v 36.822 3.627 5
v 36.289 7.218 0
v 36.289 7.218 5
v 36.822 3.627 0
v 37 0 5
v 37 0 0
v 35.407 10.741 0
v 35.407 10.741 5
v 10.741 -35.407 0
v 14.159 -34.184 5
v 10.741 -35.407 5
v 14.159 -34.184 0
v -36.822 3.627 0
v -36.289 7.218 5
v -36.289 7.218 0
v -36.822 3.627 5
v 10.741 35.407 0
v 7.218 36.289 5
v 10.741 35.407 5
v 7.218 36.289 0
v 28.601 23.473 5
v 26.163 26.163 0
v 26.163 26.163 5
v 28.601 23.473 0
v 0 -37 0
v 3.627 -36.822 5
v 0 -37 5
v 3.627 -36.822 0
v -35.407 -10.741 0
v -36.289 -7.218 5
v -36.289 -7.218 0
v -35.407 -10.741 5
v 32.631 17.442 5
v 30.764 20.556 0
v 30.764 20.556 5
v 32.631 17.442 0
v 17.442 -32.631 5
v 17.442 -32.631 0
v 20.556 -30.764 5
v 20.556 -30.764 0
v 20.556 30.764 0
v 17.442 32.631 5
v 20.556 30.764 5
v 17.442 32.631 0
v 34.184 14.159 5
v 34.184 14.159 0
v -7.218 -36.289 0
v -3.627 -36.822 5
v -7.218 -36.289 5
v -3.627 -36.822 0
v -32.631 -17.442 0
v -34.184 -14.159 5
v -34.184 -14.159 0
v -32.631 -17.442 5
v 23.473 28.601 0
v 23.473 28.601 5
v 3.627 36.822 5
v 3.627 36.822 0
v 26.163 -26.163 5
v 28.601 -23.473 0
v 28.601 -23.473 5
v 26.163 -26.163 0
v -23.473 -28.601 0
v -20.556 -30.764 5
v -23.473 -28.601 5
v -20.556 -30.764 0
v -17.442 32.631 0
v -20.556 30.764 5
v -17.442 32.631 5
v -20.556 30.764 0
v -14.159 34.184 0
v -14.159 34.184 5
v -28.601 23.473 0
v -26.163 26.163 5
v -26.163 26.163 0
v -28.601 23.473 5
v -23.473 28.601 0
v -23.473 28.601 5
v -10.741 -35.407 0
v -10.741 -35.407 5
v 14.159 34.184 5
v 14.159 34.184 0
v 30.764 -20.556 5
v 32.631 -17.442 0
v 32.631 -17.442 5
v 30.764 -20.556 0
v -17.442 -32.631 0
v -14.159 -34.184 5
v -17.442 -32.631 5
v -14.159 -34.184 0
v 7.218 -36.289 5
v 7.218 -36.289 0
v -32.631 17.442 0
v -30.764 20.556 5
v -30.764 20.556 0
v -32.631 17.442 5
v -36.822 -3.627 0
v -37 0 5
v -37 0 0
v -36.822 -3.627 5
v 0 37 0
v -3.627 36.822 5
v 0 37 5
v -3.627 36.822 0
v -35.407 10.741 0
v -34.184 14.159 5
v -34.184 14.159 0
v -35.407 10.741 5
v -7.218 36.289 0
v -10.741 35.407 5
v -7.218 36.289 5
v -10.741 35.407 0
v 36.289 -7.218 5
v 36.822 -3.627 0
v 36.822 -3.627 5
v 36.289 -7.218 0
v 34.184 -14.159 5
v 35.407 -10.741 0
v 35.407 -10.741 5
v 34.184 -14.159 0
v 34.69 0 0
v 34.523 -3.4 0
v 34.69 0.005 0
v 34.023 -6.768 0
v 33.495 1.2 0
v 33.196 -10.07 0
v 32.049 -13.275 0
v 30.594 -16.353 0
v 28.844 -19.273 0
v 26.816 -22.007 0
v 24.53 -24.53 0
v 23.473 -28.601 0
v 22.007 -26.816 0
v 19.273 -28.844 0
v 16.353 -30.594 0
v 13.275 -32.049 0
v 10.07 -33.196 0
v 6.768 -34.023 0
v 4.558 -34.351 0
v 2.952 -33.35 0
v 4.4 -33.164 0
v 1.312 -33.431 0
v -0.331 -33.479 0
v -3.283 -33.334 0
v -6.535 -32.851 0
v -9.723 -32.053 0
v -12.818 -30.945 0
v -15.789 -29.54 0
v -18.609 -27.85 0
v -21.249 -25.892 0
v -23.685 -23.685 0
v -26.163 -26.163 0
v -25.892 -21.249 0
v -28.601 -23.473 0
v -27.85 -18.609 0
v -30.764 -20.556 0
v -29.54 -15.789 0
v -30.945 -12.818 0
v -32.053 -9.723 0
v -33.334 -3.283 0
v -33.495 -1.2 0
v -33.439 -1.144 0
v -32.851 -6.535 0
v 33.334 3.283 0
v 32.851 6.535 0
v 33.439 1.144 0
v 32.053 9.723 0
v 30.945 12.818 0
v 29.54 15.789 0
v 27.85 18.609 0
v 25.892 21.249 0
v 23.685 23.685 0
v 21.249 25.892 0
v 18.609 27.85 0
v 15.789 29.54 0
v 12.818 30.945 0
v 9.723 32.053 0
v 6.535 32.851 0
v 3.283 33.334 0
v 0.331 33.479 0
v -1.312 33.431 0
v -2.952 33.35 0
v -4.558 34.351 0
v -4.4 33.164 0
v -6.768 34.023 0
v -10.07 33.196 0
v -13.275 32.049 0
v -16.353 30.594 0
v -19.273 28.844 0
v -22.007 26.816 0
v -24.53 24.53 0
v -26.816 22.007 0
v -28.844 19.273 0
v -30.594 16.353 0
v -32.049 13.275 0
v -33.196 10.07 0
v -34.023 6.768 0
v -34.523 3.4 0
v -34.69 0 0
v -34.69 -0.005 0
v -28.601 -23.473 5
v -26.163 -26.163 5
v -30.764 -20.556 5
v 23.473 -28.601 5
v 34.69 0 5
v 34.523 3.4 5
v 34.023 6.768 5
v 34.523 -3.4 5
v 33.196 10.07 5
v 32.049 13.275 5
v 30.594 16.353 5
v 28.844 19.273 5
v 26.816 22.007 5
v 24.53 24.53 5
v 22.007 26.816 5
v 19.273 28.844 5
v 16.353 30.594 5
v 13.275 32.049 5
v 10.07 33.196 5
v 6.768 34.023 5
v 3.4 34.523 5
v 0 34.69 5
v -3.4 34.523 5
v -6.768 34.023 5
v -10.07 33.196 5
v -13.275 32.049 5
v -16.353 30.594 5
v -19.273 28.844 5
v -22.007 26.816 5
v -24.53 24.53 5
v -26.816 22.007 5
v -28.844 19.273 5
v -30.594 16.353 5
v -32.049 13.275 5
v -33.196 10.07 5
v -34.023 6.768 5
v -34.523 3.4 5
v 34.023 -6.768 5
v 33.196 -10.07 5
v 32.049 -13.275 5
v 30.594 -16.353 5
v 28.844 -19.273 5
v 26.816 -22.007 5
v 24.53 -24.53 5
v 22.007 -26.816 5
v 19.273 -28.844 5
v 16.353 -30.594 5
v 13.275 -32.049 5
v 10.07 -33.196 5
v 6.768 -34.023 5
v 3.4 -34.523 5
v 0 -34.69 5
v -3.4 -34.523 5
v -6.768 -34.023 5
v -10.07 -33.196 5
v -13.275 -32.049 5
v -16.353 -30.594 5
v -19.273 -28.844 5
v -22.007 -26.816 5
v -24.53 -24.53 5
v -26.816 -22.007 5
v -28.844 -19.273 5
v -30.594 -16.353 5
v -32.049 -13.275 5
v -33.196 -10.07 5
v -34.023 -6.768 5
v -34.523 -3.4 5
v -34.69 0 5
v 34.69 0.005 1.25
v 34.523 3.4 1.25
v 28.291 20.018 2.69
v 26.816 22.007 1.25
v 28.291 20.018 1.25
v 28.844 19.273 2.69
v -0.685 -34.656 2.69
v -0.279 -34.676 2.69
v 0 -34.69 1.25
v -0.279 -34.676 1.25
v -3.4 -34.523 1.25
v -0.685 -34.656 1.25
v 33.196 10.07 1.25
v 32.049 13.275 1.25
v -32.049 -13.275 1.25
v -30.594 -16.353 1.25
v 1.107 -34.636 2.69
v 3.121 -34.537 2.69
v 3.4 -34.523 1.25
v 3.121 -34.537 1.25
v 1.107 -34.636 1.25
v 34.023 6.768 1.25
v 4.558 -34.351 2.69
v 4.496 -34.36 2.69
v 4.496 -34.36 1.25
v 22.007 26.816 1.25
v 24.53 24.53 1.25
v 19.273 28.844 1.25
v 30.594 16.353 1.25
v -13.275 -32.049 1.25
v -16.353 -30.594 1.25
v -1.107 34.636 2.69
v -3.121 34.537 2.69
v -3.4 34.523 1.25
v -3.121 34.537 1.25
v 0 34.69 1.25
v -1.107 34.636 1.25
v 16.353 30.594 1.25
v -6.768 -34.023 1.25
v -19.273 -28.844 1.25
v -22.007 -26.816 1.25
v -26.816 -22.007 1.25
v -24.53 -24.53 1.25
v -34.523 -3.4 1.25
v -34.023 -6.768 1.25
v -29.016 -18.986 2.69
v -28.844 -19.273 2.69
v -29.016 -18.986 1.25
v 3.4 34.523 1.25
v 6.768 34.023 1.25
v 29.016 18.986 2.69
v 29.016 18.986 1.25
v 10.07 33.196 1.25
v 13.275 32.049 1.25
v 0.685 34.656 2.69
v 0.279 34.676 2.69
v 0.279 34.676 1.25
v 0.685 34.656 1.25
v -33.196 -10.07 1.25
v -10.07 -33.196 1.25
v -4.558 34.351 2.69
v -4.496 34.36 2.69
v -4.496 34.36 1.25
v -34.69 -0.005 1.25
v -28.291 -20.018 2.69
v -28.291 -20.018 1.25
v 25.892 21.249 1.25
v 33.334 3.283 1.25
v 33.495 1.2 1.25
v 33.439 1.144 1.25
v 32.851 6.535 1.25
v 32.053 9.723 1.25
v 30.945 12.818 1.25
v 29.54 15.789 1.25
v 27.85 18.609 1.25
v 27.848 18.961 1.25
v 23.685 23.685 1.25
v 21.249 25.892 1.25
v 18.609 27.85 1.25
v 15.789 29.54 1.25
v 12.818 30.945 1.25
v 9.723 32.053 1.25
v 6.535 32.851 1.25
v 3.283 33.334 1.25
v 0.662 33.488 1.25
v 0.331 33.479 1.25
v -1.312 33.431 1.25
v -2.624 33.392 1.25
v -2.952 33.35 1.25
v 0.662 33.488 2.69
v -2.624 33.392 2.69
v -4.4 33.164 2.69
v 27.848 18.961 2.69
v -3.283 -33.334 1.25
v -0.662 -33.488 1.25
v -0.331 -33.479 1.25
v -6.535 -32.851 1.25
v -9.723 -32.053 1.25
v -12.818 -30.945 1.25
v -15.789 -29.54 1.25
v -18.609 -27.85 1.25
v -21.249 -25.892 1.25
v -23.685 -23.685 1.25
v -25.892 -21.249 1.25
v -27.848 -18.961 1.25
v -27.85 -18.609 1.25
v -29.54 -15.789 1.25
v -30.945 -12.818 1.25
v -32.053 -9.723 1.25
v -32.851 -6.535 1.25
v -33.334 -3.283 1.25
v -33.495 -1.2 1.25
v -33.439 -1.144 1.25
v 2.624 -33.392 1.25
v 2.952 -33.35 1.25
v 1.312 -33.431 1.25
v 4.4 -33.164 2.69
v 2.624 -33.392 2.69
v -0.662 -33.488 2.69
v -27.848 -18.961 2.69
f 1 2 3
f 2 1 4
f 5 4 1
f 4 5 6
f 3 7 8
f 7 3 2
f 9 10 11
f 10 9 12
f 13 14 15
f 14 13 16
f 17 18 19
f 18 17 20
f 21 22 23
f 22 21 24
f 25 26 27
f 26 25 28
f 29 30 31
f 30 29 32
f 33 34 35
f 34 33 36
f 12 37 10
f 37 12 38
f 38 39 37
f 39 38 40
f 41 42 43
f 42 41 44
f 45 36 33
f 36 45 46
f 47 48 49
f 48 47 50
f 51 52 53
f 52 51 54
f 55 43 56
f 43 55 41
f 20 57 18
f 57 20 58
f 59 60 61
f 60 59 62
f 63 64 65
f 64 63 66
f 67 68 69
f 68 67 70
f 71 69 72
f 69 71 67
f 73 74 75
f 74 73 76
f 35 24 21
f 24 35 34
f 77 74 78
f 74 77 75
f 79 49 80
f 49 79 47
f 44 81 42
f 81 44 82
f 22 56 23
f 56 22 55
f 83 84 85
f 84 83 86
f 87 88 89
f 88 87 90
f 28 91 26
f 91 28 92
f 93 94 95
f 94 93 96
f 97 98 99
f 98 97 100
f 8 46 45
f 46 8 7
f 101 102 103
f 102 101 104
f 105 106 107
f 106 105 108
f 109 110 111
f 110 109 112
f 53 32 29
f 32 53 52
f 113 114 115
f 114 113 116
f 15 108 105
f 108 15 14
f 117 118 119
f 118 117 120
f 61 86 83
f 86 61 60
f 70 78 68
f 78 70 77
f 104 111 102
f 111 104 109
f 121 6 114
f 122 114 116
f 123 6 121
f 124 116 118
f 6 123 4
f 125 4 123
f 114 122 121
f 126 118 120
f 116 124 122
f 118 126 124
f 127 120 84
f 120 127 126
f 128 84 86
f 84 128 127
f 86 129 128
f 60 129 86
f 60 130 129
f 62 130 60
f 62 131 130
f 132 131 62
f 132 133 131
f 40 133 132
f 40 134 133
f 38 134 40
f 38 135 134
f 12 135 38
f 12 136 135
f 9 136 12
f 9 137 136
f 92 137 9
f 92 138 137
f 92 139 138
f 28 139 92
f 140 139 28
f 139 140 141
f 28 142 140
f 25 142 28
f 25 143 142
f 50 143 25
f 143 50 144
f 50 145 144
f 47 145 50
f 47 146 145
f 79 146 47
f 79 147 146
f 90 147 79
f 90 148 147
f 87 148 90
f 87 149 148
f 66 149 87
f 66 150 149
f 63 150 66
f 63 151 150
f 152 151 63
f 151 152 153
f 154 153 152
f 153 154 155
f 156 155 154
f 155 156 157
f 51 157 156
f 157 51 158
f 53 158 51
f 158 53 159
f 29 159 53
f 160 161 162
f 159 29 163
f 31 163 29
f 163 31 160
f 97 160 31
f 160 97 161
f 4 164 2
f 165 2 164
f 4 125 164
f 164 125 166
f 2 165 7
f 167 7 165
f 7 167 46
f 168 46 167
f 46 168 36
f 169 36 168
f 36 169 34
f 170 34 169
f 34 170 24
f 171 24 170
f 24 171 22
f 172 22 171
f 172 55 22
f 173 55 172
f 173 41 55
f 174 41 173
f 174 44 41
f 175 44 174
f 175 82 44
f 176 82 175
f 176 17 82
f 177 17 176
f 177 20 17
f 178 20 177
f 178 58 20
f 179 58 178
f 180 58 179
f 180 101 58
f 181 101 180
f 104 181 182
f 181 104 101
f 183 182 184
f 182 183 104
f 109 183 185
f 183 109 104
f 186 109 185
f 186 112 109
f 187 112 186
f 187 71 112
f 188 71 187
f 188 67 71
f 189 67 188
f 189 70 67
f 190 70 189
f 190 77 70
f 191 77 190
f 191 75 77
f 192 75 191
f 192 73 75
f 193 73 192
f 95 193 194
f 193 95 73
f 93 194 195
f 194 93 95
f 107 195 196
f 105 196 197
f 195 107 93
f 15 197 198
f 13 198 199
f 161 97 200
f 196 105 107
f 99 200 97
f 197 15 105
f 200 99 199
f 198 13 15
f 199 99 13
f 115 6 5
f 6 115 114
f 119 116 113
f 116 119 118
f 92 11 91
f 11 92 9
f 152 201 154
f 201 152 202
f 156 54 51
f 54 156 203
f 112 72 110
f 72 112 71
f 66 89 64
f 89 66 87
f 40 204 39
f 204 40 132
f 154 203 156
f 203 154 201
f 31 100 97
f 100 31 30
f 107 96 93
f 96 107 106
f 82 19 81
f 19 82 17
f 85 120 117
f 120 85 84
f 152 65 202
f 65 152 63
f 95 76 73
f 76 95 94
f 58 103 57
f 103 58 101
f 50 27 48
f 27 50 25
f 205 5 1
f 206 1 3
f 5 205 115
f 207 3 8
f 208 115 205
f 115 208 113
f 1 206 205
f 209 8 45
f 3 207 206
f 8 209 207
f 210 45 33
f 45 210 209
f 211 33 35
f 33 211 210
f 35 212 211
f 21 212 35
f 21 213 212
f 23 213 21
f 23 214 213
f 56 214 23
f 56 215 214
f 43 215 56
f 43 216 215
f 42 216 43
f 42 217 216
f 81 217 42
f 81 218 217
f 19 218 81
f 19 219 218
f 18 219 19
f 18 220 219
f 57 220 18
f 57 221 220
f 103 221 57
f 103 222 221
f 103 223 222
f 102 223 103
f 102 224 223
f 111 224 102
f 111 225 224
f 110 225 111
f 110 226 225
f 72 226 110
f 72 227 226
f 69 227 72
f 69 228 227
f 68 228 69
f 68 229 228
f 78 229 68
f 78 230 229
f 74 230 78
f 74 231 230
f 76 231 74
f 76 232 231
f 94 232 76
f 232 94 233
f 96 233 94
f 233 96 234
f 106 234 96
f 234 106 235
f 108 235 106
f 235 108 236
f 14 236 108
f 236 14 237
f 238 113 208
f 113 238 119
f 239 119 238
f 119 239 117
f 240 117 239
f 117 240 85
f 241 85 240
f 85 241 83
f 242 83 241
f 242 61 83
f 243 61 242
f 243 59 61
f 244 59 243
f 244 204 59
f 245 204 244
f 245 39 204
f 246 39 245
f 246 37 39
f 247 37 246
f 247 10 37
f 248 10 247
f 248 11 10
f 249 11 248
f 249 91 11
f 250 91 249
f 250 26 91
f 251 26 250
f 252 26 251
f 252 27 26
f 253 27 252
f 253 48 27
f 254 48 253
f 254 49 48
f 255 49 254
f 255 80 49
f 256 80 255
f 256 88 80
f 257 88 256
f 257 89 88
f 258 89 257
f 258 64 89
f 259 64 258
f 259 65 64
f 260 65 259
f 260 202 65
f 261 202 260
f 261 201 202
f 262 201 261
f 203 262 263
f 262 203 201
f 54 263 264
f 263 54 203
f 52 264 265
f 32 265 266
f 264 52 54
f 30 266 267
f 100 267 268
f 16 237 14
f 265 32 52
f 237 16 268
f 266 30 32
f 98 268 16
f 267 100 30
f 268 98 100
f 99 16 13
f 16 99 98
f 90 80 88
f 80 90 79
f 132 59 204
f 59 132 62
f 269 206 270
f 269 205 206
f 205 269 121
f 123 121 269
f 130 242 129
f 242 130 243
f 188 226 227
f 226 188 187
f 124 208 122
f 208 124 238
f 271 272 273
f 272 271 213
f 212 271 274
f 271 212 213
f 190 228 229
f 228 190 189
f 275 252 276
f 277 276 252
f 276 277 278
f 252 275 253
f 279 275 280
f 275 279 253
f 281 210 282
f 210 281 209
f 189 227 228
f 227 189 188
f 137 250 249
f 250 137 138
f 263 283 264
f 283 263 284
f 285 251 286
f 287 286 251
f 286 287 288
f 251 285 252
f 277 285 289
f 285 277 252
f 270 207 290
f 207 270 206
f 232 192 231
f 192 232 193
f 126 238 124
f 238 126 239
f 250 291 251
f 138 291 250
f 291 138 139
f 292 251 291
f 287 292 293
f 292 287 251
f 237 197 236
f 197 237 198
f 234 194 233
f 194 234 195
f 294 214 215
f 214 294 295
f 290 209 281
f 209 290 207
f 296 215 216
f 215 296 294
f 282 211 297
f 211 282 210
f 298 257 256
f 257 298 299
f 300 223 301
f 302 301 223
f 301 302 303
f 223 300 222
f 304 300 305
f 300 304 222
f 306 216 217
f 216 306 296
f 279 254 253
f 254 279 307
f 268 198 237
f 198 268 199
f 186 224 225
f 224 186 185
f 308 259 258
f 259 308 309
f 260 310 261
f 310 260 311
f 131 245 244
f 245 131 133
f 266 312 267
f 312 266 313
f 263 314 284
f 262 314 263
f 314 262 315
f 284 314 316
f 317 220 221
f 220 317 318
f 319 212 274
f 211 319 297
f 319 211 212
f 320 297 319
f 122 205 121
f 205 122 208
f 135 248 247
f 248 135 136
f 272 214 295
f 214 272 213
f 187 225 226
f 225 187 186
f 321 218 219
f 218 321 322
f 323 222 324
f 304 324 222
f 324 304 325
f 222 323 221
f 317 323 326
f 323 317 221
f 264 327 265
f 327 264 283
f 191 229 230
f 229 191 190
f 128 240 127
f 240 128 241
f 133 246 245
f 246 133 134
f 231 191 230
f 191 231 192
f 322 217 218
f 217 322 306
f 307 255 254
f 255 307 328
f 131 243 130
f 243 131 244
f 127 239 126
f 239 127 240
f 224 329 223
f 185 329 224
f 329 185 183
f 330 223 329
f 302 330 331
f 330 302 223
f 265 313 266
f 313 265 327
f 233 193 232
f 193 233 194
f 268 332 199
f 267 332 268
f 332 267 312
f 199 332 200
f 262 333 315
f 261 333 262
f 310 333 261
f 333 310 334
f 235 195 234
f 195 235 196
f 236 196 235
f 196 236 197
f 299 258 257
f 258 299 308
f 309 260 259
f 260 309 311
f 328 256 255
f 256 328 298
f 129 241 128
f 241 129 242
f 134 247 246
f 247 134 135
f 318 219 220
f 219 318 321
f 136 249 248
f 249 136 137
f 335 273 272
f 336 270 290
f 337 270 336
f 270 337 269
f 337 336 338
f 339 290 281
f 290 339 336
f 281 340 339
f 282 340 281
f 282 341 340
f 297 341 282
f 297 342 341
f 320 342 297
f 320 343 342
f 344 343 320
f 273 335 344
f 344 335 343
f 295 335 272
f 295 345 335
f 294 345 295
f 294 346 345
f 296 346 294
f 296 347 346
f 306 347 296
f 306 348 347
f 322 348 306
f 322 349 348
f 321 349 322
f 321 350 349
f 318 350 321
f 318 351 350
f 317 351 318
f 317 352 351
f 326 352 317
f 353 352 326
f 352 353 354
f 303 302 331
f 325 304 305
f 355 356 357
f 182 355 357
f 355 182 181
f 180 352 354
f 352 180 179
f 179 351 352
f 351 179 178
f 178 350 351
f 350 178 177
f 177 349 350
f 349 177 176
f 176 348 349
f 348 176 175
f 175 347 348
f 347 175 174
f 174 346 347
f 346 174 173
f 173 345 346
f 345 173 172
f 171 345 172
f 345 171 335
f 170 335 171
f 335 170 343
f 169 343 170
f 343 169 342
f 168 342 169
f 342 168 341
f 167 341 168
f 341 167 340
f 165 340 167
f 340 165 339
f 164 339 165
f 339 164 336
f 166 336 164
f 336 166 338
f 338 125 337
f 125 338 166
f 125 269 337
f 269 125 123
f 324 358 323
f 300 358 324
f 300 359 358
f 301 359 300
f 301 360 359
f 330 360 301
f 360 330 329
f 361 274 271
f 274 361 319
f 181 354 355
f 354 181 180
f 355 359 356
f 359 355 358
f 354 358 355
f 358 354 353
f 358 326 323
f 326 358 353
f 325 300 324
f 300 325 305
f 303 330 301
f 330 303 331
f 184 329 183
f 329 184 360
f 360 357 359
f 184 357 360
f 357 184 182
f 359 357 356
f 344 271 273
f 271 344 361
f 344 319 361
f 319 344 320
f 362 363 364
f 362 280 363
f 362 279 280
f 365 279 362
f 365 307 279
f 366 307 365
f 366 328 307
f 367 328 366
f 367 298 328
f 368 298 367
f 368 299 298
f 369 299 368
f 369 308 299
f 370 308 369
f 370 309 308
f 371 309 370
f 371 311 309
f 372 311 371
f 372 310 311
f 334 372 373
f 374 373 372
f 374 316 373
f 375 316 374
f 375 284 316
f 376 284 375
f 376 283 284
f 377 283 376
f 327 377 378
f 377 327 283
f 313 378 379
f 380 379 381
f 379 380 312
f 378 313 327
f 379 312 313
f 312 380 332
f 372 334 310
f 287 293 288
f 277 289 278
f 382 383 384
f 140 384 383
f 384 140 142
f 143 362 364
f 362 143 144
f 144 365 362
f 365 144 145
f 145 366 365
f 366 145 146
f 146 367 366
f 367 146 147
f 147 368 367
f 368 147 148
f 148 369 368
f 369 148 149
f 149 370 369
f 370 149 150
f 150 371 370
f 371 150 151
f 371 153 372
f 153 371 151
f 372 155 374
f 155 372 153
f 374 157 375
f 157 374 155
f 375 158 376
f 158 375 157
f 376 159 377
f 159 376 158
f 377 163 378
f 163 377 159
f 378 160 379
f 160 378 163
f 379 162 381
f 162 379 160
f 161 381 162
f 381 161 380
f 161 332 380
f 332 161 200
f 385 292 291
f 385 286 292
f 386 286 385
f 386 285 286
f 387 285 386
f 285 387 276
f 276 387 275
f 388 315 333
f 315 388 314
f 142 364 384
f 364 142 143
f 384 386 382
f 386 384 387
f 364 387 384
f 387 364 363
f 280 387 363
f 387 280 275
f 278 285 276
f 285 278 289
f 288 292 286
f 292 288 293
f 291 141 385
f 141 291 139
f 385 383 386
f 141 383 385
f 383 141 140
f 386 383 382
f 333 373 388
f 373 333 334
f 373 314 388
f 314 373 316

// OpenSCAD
lensBaseDiameter = 66;
lensThreadLinearLength = 36.64;
lensThreadLinearLengthToDetent = 30.28;
lensThreadHeight = 1.19;
lensThreadWidth = 1.5;
lensSpaceBelowThread = 1.5;
detentWidth = 1.3;
detentDepth = 1;
endStopLinearLength = 5;
angularTolerance = 15;

outerDiameter = 74;
height = 5;

zTolerance = 0.25;
xyTolerance = 0.5;

function linearToAngular(l,r=lensBaseDiameter/2) = 
    2*asin(l/(2*r));
    
nudge = 0.01;

module hollowCylinder(d1=10,d2=20,h=10) {
    render(convexity=2) 
    difference() {
        cylinder(d=d2,h=h);
        translate([0,0,-nudge]) cylinder(d=d1,h=h+2*nudge);
    }
}
    
module arc(angle=180,d=undef,r=10,width=1,outward=true,center=true,chamferLowerEnd=false) {
    r0 = d==undef ? r : d/2;
    r1 = outward ? r0 : r0-width;
    r2 = outward ? r0+width : r0;
    adjR2 = 4*r2;
    angle0 = center ? -angle/2 : 0;
    render(convexity=2)
    difference() {
        intersection() {
            difference() {
                circle(r=r2);
                circle(r=r1);
            }
            if (angle<360)
               polygon(concat([[0,0]], adjR2*[for(i=[0:3]) [cos(angle*i/3+angle0),sin(angle*i/3+angle0)]]));
        }
        if(chamferLowerEnd) {
            rotate(angle0) translate([r1,0]) circle(r=width,$fn=4);
        }
    }
}

module base() {
    d1 = lensBaseDiameter+2*lensThreadHeight+2*xyTolerance;
    arcAngle = 180-linearToAngular(lensThreadLinearLength)-angularTolerance;
    endStopAngle = linearToAngular(endStopLinearLength);

    module detent() {
        polygon([[d1/2-detentDepth,0],[d1/2,-detentWidth/2],[d1/2,detentWidth/2]]);
    }

    hollowCylinder(d2=outerDiameter,d1=d1, h=height);
    
    for (rot=[0:180:180]) rotate([0,0,rot]) {
        linear_extrude(height=lensSpaceBelowThread-zTolerance) {
            {
                arc(angle=arcAngle,d=d1+nudge,width=nudge+lensThreadHeight, center=false,outward=false,chamferLowerEnd=true);
            }
        }
        linear_extrude(height=lensSpaceBelowThread+lensThreadHeight) {
            rotate(arcAngle-endStopAngle)
            arc(angle=endStopAngle,d=d1+nudge,width=nudge+lensThreadHeight, center=false, outward=false);
            rotate(arcAngle-endStopAngle-linearToAngular(lensThreadLinearLengthToDetent)) detent();            
        }
    }
}

$fn = 64;
base();
